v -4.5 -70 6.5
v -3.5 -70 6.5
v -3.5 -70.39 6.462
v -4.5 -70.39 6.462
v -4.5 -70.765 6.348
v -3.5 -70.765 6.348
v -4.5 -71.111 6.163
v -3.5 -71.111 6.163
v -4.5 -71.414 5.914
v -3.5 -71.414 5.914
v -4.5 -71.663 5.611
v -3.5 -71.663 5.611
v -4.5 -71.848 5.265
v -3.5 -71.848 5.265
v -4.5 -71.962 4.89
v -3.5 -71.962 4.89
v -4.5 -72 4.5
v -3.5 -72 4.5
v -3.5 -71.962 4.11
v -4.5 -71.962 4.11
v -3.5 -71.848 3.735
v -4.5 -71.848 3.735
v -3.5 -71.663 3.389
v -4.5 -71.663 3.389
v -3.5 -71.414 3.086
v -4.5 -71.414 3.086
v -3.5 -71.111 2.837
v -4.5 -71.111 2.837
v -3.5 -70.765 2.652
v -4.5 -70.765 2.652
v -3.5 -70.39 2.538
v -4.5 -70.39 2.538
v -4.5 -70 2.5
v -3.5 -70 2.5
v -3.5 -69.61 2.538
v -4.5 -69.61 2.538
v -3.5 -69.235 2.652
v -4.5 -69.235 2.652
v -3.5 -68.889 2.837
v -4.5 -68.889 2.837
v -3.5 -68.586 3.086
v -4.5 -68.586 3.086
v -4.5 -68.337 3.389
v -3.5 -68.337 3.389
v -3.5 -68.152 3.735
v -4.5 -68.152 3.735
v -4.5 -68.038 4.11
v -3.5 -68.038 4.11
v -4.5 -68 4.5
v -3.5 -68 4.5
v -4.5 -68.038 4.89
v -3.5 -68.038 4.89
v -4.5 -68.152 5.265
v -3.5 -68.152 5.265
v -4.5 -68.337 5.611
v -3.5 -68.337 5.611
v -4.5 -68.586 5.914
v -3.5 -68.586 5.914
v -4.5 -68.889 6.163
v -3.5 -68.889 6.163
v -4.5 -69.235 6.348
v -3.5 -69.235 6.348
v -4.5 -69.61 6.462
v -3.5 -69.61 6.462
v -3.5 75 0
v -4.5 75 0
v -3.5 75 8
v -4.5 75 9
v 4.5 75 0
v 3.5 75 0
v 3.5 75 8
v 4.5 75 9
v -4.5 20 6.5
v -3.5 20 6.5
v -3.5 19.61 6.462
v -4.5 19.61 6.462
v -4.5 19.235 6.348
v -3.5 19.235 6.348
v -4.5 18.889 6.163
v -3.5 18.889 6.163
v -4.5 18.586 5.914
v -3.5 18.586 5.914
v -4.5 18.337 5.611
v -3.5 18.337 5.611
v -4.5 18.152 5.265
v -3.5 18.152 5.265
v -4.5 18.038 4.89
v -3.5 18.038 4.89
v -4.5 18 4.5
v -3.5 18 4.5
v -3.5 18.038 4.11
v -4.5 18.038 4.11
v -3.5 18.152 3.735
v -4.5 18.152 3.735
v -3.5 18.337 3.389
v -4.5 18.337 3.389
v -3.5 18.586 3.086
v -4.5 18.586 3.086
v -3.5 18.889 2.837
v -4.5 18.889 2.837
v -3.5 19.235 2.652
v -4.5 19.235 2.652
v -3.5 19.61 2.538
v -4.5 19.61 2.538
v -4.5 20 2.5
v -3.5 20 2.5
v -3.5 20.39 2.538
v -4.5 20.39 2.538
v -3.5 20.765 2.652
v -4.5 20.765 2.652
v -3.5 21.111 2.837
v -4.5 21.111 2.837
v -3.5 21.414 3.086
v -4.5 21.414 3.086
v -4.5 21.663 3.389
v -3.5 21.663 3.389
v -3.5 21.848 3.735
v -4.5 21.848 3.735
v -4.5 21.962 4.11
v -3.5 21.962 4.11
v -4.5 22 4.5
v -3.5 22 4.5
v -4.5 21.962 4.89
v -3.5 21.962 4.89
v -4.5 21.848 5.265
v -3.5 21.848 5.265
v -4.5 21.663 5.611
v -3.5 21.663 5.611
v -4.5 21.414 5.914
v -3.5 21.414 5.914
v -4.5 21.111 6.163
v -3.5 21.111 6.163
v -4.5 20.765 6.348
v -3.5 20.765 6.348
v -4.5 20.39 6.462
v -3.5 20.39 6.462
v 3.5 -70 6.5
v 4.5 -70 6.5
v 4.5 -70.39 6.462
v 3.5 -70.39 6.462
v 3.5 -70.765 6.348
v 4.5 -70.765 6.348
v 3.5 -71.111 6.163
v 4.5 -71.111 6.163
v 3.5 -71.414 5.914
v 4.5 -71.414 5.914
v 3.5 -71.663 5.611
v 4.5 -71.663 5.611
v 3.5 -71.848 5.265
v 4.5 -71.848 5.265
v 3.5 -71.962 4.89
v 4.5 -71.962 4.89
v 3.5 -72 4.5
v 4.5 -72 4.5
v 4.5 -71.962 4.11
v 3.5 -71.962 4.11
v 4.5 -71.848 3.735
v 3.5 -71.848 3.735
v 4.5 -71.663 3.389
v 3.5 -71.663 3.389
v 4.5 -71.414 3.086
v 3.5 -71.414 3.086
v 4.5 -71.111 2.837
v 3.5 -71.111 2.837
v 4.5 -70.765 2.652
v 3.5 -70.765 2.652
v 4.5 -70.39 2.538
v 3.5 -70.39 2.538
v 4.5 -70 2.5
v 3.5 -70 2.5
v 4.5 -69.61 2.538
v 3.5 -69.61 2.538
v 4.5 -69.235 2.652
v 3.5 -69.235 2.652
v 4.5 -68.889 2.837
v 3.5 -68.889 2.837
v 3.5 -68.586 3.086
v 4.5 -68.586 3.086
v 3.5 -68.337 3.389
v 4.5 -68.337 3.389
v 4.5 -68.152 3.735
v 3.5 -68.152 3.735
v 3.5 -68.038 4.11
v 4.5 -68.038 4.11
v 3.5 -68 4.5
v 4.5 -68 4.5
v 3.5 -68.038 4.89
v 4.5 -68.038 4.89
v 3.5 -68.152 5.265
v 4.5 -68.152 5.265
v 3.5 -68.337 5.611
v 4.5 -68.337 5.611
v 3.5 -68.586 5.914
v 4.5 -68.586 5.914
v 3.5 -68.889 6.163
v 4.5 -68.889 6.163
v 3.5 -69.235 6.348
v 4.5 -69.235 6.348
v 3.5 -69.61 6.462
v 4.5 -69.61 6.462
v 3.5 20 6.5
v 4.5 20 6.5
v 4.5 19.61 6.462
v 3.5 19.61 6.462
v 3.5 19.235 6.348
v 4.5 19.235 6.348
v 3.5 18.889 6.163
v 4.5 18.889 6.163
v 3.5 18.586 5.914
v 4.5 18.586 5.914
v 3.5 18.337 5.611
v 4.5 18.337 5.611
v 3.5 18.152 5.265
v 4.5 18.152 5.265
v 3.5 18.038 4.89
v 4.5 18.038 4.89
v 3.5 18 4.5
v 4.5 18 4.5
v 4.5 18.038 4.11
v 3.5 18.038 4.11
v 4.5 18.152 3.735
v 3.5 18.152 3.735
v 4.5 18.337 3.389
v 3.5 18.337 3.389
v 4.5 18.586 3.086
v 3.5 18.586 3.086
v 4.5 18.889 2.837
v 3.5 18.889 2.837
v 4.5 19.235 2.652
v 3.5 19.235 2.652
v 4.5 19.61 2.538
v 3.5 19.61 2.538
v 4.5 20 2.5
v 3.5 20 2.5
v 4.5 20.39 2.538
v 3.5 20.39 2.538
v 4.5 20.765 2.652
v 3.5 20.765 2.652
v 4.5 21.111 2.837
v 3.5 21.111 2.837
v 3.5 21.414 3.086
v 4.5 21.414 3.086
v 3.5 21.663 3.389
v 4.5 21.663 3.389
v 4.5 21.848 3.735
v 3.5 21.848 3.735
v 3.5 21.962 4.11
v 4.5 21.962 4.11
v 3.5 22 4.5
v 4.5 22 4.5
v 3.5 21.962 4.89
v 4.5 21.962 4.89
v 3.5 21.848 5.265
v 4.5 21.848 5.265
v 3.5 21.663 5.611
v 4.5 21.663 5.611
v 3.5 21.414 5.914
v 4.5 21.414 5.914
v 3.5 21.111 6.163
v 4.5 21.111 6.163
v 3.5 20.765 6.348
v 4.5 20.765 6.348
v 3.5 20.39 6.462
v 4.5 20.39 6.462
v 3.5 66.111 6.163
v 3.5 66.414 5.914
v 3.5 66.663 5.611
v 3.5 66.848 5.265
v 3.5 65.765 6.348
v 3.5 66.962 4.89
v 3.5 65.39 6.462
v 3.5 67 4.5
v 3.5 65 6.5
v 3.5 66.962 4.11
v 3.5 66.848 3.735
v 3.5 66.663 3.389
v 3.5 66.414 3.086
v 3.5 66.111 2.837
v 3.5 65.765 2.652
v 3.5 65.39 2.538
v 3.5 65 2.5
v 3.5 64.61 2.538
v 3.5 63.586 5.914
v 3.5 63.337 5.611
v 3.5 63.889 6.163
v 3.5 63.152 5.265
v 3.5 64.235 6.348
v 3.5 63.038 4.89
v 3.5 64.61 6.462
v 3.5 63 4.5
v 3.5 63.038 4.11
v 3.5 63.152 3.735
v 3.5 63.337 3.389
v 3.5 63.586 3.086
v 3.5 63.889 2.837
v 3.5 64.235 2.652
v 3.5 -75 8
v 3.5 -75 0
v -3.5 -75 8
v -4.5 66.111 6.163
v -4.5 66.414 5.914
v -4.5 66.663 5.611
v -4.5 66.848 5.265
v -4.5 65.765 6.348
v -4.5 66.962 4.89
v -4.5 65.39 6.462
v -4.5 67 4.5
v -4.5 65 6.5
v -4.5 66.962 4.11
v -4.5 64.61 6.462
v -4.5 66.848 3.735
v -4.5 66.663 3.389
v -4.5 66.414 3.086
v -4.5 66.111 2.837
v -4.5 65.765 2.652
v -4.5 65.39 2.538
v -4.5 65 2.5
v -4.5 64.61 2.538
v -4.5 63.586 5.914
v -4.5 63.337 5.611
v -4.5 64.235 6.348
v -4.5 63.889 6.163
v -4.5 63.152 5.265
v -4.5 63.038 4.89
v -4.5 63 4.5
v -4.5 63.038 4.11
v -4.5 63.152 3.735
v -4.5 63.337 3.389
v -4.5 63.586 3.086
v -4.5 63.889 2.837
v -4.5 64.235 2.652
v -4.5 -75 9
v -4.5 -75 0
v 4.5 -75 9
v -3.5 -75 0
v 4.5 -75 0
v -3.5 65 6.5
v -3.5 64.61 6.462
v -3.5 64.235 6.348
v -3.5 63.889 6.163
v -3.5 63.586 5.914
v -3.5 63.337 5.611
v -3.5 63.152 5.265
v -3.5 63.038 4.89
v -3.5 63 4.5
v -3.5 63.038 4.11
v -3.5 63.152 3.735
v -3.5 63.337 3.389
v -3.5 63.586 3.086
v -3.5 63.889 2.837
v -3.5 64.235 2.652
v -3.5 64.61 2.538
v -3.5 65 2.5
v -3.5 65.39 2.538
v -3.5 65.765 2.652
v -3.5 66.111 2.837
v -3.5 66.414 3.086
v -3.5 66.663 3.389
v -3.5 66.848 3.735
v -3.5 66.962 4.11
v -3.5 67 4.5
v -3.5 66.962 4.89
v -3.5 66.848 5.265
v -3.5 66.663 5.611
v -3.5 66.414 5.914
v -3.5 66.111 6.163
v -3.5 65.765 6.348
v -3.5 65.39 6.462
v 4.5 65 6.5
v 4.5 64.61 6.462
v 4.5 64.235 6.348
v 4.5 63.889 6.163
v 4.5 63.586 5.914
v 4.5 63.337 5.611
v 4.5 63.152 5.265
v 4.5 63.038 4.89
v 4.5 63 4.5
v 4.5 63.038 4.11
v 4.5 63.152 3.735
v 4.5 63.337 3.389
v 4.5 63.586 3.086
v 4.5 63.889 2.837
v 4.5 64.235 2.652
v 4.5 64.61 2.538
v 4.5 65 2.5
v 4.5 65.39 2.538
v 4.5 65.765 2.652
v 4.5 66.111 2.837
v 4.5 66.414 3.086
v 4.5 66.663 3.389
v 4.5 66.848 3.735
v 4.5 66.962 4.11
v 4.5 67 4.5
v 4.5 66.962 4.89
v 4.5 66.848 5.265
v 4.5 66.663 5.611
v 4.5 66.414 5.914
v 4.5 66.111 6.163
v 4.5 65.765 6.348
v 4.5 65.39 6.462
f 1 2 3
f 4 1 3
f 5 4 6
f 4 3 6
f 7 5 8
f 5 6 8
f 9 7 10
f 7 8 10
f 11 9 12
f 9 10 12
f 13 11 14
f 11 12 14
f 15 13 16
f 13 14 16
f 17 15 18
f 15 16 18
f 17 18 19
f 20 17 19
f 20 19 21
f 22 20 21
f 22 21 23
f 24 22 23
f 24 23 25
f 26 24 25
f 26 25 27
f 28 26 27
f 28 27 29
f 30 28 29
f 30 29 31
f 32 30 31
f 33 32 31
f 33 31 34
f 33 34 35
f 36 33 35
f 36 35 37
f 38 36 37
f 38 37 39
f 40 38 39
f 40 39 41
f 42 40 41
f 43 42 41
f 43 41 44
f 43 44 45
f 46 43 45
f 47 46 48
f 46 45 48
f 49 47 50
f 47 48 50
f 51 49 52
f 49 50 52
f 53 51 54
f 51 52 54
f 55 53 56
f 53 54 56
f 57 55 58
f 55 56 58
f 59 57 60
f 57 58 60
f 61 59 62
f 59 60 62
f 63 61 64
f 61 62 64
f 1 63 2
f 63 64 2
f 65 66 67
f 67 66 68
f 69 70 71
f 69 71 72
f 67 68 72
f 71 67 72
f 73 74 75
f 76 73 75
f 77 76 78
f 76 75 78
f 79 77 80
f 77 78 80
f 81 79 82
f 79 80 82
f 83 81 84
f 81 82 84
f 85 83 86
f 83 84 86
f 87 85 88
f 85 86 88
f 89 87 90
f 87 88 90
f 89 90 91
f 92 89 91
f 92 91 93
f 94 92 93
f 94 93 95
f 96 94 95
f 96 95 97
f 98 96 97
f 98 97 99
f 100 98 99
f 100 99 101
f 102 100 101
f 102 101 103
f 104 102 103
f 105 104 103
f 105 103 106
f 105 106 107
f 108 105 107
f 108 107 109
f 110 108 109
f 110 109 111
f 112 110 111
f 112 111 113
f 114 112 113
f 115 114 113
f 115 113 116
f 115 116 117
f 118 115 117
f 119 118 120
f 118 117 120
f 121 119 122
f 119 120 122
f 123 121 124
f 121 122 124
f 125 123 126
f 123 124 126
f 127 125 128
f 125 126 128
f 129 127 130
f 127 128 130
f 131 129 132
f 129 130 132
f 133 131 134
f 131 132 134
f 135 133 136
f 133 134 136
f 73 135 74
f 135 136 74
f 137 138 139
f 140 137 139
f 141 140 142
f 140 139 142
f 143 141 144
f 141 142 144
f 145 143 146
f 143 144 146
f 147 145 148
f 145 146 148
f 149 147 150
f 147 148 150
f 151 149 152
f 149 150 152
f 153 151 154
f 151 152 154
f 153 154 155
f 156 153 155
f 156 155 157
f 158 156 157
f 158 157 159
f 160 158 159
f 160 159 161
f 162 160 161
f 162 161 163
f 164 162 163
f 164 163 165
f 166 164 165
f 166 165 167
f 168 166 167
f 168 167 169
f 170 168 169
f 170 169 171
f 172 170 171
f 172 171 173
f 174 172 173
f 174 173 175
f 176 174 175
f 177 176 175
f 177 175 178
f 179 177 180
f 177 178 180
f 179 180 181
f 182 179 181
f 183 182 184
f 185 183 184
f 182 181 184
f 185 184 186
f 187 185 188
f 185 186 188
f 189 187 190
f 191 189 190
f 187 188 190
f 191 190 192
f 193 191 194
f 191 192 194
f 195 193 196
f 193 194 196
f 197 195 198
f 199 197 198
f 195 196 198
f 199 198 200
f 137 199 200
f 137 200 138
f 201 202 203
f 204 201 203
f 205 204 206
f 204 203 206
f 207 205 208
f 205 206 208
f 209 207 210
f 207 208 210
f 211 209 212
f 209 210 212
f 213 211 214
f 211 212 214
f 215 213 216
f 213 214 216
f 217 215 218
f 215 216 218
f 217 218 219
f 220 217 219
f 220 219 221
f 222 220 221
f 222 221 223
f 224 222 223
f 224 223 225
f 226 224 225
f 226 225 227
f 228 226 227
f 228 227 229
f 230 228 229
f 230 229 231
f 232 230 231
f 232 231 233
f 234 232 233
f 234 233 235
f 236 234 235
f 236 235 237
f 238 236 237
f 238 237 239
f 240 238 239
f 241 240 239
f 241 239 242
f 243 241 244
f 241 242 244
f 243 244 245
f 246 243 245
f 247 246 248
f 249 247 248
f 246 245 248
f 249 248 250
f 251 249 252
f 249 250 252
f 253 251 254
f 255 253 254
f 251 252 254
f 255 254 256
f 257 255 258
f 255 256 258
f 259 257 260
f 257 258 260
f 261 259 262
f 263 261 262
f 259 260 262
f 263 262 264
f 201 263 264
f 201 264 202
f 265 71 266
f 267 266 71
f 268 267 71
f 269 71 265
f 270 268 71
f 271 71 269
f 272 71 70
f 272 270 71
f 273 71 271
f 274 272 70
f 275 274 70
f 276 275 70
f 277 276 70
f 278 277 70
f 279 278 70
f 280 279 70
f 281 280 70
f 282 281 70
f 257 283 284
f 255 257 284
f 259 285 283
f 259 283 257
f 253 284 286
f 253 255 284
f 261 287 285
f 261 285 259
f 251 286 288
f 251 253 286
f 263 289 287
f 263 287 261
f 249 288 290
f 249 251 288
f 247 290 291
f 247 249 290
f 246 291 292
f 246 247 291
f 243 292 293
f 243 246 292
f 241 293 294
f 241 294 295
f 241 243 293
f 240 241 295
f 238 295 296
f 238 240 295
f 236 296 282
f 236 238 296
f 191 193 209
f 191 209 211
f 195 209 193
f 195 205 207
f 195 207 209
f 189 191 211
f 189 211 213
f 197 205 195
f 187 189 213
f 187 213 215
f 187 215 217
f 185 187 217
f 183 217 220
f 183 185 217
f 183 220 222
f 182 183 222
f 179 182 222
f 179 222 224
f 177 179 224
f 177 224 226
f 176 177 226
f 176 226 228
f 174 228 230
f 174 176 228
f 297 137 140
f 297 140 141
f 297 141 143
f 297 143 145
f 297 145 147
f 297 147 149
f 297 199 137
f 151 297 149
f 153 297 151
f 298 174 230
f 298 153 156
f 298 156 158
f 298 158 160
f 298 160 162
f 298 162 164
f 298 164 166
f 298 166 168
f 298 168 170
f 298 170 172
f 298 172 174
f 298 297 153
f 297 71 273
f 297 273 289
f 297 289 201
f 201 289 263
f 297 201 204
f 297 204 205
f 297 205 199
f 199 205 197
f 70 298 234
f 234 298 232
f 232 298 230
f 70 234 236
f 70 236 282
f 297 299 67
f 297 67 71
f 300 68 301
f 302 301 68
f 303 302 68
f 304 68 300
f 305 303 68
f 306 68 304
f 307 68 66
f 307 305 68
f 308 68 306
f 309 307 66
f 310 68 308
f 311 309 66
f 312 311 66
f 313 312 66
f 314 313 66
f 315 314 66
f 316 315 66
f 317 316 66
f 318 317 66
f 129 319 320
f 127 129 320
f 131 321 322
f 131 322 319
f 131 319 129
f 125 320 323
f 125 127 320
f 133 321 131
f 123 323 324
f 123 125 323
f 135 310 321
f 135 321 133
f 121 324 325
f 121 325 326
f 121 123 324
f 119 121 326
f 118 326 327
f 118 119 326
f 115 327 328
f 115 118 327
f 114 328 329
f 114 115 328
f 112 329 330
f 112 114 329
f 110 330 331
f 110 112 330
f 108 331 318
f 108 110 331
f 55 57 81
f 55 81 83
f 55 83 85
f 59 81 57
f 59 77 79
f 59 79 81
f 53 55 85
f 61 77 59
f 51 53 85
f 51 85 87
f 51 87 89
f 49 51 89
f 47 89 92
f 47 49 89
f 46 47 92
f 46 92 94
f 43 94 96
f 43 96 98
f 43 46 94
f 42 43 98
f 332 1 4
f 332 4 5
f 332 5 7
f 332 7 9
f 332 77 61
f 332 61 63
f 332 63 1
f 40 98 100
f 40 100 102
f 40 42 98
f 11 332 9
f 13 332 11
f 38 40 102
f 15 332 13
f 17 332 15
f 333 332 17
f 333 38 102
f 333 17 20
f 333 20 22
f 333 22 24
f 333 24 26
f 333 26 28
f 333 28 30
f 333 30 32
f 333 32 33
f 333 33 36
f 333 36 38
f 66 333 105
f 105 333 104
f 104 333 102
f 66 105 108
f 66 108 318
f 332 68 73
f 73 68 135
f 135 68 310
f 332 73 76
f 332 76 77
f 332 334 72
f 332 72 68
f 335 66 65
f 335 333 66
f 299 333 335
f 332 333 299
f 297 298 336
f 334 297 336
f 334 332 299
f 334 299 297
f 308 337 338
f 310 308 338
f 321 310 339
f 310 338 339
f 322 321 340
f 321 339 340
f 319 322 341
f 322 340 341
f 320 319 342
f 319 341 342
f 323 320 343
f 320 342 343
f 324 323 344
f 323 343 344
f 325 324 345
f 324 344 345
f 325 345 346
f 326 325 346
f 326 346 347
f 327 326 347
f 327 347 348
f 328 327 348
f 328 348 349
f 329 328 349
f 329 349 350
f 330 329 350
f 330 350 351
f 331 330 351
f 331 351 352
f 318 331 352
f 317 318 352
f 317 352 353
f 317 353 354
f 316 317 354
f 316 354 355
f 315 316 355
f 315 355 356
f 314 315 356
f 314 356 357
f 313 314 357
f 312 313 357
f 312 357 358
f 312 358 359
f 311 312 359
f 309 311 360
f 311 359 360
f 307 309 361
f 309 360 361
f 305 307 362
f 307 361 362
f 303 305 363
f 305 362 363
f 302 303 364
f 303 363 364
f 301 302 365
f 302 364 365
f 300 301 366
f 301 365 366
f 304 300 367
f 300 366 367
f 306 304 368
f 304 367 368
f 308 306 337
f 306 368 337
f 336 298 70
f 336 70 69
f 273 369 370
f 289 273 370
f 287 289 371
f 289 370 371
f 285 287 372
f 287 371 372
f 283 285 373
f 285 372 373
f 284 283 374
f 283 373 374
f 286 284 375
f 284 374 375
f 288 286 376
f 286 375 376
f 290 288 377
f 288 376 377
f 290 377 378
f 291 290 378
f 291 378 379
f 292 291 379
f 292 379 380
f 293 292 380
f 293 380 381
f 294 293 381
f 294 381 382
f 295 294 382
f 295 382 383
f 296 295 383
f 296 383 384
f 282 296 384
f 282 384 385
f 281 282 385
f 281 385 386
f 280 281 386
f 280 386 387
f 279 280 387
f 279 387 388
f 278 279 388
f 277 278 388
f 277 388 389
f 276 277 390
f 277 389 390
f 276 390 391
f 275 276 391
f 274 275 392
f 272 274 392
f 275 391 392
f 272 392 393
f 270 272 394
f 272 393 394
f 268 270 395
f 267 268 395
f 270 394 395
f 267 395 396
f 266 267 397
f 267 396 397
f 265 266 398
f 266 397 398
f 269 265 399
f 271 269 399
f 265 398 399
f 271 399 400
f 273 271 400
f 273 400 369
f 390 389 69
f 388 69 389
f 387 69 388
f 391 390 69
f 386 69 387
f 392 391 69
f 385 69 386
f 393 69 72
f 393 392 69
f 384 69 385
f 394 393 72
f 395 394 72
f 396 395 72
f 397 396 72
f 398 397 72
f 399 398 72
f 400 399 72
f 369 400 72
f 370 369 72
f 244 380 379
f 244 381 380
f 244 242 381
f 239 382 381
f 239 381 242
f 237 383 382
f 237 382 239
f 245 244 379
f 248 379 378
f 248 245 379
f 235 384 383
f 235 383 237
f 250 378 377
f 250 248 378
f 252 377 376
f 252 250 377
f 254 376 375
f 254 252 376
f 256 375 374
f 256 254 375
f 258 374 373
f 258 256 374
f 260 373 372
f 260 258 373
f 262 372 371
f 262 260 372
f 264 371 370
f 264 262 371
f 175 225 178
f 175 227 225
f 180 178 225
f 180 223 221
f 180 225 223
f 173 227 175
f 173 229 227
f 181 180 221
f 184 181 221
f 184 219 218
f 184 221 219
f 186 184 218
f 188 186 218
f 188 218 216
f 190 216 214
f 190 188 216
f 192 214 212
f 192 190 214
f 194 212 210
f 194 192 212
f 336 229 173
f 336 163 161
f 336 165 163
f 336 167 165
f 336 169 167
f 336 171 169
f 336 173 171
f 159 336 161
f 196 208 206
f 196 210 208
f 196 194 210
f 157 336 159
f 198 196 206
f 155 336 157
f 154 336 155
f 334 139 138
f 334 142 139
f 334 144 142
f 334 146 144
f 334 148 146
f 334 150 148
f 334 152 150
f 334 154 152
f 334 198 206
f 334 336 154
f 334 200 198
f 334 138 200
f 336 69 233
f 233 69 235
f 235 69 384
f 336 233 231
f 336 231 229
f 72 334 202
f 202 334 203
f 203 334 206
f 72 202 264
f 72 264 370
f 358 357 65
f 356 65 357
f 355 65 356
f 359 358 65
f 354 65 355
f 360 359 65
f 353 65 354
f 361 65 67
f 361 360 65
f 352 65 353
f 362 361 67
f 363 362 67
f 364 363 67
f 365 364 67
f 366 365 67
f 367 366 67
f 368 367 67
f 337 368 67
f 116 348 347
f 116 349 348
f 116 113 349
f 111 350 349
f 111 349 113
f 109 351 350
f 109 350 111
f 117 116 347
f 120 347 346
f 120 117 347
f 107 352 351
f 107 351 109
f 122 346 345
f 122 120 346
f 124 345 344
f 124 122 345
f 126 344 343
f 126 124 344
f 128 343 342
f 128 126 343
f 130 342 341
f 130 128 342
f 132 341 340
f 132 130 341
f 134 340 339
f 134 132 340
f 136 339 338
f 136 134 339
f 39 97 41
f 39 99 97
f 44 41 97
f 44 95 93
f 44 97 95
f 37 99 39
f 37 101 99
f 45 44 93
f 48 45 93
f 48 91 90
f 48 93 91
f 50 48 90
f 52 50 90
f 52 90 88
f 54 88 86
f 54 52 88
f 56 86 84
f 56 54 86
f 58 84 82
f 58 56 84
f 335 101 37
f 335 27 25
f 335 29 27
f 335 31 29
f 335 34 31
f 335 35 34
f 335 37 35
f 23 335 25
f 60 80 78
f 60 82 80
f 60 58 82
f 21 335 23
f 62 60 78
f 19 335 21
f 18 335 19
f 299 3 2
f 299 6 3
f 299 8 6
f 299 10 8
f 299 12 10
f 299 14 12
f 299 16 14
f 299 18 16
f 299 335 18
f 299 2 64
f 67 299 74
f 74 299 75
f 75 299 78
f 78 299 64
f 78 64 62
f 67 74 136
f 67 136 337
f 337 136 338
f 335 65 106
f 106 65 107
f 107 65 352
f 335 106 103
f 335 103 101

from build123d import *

# Parameters (mm, degrees)
PAD_DEPTH    = 75
SKETCH001_R  = 2
POCKET_DEPTH = 9.001


with BuildPart() as part:
    # Sketch → Pad (new body, symmetric)
    with BuildSketch(Plane.XZ):
        Polygon((-3.5, 0), (-3.5, 8), (3.5, 8), (3.5, 0), (4.5, 0), (4.5, 9), (-4.5, 9), (-4.5, 0), align=None)
    extrude(amount=PAD_DEPTH, both=True)

    # Sketch001 → Pocket (cut, through all)
    with BuildSketch(Plane(origin=(4.5, 0, 0), x_dir=(0, 0, 1), z_dir=(1, 0, 0))):
        with Locations((4.5, 70)):
            Circle(SKETCH001_R)
        with Locations((4.5, -65)):
            Circle(SKETCH001_R)
        with Locations((4.5, -20)):
            Circle(SKETCH001_R)
    extrude(amount=-POCKET_DEPTH, mode=Mode.SUBTRACT)


solid = part.part
